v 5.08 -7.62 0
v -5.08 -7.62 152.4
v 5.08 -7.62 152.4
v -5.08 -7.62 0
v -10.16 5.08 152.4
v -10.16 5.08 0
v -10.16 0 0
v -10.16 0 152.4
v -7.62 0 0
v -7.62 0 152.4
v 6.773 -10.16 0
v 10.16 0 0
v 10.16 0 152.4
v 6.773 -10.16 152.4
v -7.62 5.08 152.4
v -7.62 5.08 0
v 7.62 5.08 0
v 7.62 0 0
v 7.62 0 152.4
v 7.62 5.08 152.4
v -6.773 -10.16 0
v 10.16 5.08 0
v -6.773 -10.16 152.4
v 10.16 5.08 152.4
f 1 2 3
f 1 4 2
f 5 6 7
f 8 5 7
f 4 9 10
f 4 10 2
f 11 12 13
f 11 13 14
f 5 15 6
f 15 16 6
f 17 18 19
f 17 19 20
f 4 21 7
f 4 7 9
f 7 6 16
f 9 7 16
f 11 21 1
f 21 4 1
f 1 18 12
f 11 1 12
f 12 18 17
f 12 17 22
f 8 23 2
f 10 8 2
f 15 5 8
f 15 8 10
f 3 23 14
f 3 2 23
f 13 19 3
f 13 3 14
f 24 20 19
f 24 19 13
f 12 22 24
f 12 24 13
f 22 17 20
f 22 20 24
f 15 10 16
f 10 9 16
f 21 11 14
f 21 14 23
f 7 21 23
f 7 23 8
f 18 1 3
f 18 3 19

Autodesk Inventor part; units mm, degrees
ref_plane "YZ Plane" through (0, 0, 0) normal (1, 0, 0) x (0, 1, 0)
ref_plane "XZ Plane" through (0, 0, 0) normal (0, 1, 0) x (-1, 0, 0)
ref_plane "XY Plane" through (0, 0, 0) normal (0, 0, 1) x (1, 0, 0)
sketch "Sketch1" plane through (0, 0, 0) normal (0, 0, 1) x (1, 0, 0)
  circle A0 centre (0, 0) radius 7.62
  line L0 (-7.62, 0) -> (-7.62, 5.08)
  line L1 (0, -7.62) -> (-5.08, -7.62)
  line L2 (0, -7.62) -> (5.08, -7.62)
  line L3 (-7.62, 0) -> (-5.08, -7.62)
  line L4 (5.08, -7.62) -> (7.62, 0)
  line L5 (7.62, 0) -> (7.62, 5.08)
  line L6 (-7.62, 5.08) -> (-10.16, 5.08)
  line L7 (-10.16, 5.08) -> (-10.16, 0)
  line L8 (-5.08, -7.62) -> (-6.7733, -10.16)
  line L9 (-6.7733, -10.16) -> (-10.16, 0)
  line L10 (7.62, 5.08) -> (10.16, 5.08)
  line L11 (10.16, 5.08) -> (10.16, 0)
  line L12 (10.16, 0) -> (6.7733, -10.16)
  line L13 (6.7733, -10.16) -> (-6.7733, -10.16)
  line L14 (5.08, -7.62) -> (6.7733, -10.16)
  dimension "d0" = 15.24
  dimension "d1" = 5.08
  dimension "d2" = 5.08
  dimension "d3" = 5.08
  dimension "d4" = 5.08
  dimension "d6" = 2.54
  dimension "d7" = 2.54
  dimension "d8" = 2.54
extrude "Extrusion1" add sketch "Sketch1" along normal blind 152.4 contours L5 L10 L11 L12 L14 L4 A0 | A0 L4 | L3 A0 | A0 L3 L8 L9 L7 L6 L0 | L2 L14 L13 L8 L1
properties part number "StraightTrackv2"
